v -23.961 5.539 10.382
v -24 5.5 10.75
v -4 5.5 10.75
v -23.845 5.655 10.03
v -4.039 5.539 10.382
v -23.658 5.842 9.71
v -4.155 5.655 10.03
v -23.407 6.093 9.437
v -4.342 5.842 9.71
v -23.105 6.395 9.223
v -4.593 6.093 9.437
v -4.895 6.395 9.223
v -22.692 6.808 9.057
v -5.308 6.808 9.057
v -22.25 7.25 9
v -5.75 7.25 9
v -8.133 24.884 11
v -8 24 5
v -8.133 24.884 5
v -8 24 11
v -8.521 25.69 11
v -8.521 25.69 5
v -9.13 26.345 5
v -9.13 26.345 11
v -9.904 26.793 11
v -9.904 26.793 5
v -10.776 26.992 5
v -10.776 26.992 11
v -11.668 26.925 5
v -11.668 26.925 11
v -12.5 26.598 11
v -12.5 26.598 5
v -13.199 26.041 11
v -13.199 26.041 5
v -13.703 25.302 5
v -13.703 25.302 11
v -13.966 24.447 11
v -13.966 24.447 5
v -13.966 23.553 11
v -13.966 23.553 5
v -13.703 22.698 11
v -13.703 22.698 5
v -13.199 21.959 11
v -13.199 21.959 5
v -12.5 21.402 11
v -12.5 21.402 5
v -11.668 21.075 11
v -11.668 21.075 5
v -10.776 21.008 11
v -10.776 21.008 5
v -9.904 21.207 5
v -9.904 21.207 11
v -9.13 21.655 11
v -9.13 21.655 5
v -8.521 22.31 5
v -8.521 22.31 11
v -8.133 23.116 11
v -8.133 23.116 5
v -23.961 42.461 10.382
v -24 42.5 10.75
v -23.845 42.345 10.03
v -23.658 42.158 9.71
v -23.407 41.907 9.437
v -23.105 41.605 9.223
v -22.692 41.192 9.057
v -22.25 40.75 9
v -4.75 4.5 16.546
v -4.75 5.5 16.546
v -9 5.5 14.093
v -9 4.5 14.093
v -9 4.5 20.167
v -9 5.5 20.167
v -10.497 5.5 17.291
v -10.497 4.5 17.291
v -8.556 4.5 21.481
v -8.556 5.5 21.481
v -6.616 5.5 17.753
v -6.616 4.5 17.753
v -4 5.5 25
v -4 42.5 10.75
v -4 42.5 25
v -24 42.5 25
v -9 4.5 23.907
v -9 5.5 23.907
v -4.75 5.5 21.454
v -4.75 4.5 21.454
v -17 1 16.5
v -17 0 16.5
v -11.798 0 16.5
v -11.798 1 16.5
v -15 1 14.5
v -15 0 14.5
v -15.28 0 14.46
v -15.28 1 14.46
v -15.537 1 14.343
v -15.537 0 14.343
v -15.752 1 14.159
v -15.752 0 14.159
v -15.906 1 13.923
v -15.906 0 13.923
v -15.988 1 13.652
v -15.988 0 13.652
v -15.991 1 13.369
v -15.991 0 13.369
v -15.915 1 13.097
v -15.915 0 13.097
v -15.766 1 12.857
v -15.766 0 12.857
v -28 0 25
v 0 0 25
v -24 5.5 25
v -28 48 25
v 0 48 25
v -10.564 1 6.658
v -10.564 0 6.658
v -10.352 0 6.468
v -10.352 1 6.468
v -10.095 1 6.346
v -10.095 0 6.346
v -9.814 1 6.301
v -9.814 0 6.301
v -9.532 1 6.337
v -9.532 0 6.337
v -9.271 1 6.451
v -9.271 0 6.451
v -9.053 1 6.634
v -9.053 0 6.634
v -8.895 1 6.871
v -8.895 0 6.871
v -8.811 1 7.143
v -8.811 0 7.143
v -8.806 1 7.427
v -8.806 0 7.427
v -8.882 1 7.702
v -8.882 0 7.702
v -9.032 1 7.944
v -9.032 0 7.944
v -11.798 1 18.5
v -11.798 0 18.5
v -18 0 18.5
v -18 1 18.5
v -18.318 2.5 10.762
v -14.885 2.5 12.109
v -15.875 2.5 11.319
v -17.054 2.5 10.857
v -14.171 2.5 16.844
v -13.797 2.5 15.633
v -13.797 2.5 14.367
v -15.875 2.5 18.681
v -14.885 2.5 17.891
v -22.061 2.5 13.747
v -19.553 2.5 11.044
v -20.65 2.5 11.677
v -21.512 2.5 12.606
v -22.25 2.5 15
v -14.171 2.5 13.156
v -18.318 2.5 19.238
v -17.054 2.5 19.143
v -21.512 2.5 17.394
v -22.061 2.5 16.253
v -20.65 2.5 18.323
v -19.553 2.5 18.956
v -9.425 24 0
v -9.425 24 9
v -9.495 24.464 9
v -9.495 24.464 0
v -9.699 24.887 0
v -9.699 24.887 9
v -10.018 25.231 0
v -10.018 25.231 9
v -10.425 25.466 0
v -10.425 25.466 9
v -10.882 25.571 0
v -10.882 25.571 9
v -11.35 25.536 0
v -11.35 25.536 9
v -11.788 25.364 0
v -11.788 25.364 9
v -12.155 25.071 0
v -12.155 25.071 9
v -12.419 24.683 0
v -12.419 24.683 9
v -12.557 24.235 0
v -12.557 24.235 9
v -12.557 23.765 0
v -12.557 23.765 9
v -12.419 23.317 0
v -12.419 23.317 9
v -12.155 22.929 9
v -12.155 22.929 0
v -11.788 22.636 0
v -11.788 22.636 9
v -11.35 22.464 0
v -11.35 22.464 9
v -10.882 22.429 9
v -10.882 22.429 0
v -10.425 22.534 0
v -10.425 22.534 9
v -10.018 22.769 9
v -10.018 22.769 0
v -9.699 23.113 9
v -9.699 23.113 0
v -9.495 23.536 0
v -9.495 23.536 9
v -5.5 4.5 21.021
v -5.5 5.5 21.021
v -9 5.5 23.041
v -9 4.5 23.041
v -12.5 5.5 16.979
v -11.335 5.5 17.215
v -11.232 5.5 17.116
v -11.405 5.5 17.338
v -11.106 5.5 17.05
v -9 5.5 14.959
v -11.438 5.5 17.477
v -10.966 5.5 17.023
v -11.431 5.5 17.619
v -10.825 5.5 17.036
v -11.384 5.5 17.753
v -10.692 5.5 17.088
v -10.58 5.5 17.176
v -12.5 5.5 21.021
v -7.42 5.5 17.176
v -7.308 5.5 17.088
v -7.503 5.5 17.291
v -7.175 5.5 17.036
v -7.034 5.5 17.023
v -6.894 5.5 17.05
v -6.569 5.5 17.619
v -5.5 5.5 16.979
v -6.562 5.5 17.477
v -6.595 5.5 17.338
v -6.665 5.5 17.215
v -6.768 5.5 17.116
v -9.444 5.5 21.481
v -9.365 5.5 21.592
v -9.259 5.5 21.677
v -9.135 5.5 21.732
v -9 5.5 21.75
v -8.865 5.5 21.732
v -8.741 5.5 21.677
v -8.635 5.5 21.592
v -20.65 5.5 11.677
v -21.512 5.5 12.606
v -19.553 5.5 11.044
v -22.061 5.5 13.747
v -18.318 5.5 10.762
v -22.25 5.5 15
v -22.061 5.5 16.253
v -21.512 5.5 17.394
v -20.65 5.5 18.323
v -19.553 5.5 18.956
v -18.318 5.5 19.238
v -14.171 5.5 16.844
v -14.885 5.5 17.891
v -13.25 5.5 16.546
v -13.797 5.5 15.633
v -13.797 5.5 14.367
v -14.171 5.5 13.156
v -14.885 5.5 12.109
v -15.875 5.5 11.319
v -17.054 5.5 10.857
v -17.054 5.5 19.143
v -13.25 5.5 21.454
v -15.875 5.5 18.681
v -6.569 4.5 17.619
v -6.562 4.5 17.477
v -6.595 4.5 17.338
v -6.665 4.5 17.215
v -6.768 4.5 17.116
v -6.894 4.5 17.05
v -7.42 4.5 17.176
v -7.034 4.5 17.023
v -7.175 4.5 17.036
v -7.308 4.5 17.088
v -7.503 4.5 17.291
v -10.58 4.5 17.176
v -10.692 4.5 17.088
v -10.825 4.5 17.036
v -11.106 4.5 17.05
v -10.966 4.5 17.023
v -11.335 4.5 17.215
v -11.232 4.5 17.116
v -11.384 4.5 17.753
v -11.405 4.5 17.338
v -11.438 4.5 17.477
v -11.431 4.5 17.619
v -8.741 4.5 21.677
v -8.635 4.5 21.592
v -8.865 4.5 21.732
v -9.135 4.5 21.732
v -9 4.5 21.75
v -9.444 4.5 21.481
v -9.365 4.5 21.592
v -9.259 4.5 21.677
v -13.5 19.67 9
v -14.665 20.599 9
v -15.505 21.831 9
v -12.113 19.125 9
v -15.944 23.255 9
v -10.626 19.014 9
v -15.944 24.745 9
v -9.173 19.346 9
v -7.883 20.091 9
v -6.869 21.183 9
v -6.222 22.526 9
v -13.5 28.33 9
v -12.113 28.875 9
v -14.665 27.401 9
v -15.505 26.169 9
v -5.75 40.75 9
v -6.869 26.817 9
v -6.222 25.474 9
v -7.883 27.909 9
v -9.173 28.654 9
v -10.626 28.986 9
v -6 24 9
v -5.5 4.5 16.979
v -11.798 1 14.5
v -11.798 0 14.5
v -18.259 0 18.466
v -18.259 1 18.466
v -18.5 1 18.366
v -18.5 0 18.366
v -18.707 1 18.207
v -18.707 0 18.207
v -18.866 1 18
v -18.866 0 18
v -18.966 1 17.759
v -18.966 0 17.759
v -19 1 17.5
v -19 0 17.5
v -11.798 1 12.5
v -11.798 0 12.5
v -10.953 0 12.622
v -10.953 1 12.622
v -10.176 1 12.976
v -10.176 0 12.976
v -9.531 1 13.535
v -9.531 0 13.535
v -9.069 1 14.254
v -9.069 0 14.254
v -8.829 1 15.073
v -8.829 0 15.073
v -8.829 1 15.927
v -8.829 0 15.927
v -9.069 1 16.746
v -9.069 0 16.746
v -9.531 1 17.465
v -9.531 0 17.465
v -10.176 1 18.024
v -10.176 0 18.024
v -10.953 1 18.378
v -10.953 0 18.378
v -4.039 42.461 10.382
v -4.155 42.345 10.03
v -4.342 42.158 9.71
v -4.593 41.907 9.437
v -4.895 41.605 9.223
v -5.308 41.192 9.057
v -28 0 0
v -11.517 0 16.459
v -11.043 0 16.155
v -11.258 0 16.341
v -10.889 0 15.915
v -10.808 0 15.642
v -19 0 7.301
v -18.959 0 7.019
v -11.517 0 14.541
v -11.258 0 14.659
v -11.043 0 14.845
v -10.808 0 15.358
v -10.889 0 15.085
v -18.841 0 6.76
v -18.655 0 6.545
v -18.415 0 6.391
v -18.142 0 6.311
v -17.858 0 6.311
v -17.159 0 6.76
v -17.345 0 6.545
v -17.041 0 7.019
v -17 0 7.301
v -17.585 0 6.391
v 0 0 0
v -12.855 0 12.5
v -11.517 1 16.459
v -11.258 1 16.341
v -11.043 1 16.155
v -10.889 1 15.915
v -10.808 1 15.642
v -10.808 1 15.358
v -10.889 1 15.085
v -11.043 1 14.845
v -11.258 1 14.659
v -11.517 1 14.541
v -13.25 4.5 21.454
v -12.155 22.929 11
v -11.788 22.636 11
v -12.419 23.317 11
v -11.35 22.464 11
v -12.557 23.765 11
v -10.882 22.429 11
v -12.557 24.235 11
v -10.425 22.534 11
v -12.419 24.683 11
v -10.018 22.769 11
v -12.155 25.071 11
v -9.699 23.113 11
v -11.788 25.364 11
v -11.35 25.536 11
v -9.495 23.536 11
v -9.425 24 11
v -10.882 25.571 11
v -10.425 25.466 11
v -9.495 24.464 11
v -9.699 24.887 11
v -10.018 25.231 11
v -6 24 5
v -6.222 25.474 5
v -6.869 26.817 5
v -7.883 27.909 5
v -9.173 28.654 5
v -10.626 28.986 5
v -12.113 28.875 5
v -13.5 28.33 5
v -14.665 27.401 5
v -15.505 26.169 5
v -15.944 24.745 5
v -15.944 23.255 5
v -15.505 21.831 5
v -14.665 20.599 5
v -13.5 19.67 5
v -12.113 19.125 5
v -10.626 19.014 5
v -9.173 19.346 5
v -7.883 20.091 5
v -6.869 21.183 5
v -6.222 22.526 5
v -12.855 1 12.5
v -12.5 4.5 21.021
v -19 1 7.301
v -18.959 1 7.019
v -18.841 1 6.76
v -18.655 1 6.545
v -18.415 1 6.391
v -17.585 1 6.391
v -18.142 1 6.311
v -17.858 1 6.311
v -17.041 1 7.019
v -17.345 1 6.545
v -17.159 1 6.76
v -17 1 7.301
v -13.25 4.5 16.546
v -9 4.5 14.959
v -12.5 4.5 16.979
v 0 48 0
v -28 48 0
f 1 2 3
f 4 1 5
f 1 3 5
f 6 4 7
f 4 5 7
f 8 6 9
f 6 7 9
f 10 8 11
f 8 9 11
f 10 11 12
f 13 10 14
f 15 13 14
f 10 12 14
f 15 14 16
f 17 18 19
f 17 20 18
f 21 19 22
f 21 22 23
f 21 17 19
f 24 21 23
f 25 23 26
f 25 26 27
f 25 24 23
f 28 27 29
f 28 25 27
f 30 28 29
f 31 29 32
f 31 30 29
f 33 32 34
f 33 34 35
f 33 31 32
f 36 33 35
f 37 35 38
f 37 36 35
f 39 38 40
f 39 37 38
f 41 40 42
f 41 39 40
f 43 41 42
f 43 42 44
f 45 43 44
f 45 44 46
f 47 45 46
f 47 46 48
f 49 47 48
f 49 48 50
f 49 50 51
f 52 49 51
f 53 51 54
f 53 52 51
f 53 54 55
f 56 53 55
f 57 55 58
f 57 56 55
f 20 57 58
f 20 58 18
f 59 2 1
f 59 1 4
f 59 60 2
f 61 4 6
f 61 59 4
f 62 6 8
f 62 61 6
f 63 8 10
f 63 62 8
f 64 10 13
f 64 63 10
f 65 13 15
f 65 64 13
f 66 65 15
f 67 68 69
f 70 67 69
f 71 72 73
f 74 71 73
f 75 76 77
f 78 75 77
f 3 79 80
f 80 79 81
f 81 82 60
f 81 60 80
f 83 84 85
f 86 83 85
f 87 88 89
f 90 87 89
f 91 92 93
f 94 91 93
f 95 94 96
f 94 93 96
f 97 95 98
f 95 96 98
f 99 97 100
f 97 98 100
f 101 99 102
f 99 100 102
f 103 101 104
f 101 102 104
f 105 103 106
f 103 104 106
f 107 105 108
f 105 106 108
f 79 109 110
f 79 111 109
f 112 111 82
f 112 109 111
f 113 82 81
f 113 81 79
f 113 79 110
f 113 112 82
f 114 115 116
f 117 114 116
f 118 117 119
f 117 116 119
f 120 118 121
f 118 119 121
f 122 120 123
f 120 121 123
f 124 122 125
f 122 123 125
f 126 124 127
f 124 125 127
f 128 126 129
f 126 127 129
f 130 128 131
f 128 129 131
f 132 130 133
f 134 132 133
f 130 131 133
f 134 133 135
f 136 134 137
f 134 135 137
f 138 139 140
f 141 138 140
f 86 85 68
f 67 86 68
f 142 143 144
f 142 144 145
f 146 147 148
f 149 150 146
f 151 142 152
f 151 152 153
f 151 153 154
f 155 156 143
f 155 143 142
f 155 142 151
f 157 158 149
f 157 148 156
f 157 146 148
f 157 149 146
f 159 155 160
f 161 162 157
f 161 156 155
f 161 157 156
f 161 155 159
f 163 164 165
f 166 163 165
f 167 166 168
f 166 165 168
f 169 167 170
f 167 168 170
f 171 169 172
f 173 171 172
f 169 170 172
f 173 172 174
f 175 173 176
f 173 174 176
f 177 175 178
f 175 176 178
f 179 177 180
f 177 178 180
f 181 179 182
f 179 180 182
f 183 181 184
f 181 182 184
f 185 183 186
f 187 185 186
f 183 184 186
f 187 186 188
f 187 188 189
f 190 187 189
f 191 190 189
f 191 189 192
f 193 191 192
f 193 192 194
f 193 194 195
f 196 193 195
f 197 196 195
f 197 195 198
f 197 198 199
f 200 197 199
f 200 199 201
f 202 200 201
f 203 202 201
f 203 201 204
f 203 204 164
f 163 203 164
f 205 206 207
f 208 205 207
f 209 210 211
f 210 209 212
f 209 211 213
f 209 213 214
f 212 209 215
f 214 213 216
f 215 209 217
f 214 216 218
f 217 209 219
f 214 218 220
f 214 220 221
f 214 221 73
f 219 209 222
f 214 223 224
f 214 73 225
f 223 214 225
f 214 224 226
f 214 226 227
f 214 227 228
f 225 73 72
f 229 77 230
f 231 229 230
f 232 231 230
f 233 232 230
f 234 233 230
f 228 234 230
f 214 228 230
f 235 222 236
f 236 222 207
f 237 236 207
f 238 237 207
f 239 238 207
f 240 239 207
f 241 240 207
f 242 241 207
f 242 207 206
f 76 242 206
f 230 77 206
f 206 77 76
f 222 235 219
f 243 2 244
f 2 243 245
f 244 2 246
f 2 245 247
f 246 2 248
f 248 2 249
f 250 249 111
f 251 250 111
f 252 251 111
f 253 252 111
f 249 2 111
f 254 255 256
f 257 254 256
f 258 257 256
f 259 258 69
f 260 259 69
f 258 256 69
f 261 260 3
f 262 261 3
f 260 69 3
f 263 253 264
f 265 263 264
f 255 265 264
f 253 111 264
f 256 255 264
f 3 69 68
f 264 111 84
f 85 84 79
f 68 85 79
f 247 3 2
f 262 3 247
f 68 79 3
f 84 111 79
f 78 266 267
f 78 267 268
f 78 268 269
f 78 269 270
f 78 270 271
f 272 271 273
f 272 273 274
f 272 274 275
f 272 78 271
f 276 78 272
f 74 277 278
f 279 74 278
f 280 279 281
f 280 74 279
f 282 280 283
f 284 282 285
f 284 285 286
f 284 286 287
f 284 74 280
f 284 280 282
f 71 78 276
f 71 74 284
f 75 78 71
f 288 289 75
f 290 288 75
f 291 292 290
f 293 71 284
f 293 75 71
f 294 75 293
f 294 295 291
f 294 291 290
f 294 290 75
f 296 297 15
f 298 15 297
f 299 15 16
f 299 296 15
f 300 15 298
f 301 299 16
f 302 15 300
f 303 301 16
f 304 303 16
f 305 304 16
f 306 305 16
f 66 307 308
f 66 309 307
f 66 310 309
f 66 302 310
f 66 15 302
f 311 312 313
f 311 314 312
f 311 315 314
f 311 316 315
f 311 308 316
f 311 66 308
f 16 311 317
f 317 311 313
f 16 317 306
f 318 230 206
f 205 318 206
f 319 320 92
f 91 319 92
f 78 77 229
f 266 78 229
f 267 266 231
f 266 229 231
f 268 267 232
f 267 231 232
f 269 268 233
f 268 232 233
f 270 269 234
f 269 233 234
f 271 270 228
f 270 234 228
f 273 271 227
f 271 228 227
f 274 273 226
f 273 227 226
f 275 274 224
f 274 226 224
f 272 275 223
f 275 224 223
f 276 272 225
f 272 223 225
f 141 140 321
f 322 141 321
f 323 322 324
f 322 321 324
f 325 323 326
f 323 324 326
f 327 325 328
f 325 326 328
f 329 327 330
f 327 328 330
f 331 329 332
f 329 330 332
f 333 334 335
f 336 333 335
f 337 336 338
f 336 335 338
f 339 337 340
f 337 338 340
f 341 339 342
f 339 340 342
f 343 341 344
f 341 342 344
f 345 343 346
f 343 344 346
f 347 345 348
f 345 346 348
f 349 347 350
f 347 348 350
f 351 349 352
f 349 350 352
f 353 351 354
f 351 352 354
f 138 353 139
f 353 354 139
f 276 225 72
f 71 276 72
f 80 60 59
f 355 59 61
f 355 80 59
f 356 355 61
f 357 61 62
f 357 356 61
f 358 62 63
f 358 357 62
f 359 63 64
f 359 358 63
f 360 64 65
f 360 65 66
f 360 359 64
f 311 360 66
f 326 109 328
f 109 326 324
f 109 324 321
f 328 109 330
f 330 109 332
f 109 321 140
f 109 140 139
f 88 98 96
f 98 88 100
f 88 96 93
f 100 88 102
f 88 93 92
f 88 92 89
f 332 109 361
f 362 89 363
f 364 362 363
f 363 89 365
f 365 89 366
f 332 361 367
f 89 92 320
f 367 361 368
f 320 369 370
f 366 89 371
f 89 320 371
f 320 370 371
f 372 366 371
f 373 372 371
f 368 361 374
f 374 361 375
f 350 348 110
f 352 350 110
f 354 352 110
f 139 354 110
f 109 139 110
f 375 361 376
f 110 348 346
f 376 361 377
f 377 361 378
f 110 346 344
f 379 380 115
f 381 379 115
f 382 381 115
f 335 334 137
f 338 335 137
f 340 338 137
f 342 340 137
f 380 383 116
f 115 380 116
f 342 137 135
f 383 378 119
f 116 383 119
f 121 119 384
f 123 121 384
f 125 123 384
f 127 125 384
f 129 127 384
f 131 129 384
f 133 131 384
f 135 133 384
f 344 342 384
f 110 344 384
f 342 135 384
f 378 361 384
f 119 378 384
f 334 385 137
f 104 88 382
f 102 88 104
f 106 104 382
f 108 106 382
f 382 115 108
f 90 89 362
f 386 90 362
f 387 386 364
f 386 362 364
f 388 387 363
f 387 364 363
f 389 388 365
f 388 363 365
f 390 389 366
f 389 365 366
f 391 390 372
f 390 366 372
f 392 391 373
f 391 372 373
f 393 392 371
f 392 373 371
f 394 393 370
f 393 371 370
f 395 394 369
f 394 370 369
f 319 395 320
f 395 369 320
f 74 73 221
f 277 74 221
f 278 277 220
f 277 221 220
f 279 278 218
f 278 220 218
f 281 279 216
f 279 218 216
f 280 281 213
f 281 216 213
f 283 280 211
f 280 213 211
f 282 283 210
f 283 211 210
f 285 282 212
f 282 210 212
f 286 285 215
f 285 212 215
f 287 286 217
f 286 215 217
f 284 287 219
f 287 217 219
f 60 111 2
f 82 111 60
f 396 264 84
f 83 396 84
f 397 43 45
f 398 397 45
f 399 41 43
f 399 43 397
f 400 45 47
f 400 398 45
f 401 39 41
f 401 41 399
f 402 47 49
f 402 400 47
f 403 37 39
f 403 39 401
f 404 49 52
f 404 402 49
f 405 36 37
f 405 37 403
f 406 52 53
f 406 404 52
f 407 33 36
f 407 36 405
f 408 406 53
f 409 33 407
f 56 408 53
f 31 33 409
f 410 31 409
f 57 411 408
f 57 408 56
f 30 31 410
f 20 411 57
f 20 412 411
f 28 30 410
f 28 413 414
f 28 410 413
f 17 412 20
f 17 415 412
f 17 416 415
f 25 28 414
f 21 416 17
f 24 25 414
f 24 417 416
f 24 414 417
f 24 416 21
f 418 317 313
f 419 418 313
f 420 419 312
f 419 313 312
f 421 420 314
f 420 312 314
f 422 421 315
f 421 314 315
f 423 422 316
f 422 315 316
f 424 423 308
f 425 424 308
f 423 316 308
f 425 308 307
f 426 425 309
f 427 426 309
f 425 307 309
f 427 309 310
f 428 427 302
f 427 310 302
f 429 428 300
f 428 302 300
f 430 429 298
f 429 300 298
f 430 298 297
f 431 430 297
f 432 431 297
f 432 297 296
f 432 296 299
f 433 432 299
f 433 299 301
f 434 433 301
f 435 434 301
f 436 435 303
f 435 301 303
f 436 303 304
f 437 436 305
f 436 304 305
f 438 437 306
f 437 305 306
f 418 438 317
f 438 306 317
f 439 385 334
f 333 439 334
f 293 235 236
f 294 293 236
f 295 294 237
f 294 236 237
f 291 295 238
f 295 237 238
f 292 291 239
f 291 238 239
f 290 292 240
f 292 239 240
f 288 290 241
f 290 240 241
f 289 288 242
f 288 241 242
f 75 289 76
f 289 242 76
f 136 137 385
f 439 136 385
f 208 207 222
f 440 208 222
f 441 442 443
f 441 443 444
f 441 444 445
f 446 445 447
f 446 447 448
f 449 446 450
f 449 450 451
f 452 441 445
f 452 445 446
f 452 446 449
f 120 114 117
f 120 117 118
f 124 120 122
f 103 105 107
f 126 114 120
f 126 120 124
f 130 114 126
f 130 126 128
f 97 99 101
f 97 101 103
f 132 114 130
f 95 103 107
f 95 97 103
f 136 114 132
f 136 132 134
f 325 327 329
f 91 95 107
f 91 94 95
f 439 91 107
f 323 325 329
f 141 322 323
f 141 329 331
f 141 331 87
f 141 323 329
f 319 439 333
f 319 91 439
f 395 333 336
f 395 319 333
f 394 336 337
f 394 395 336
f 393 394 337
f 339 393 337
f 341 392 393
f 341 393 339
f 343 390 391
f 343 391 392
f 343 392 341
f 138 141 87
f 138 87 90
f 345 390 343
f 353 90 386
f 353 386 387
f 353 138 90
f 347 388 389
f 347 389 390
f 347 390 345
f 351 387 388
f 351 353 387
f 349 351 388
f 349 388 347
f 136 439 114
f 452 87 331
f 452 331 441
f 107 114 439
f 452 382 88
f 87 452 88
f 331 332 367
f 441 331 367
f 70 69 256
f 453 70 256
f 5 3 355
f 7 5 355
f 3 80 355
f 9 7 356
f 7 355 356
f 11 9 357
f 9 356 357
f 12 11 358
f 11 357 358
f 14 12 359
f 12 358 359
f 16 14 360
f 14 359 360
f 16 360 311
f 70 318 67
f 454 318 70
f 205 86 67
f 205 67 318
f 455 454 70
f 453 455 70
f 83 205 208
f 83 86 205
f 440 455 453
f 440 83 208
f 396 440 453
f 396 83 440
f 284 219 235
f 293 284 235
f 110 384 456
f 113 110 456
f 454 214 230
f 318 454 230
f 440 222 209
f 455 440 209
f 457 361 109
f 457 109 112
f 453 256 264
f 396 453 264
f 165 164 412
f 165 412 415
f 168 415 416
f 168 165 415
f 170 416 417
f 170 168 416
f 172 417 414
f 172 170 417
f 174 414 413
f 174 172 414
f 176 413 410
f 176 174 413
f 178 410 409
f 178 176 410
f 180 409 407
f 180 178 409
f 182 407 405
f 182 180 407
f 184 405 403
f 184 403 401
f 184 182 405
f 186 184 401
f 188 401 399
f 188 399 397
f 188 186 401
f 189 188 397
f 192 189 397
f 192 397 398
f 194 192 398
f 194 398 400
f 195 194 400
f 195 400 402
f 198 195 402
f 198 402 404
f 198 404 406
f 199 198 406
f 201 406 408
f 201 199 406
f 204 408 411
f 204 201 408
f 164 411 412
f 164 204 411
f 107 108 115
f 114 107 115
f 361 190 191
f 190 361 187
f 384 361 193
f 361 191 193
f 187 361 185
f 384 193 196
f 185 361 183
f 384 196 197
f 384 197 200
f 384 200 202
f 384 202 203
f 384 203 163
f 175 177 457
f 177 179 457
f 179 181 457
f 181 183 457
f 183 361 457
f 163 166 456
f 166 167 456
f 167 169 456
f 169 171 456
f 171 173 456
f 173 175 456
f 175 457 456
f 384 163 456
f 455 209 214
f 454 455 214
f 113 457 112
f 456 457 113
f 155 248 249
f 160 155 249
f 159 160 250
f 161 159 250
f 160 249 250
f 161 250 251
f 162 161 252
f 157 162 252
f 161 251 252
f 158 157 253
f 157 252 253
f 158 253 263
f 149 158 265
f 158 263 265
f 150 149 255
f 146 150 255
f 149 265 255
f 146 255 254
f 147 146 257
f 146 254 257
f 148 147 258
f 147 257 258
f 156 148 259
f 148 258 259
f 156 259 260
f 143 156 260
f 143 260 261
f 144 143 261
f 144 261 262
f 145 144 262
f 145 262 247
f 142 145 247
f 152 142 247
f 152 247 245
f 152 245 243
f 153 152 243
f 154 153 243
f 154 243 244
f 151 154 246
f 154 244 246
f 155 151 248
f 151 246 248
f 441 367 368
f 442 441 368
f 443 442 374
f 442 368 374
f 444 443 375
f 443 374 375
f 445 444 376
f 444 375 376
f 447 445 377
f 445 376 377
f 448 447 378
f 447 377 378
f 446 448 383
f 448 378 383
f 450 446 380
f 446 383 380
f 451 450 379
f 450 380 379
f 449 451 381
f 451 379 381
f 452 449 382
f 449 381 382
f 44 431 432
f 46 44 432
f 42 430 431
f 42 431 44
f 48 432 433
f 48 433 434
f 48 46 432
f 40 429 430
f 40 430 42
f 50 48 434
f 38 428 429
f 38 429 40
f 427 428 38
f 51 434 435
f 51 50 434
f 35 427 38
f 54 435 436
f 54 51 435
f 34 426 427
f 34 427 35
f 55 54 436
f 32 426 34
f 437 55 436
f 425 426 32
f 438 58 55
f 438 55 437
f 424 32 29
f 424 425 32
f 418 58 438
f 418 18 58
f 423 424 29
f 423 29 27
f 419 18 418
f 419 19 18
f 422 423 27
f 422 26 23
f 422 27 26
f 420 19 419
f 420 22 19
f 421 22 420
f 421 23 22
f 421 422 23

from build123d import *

# Parameters (mm, degrees)
F0_W      = 28
F0_H      = 48
F1_DEPTH  = 25
F2_W      = 20
F2_H      = 37
F3_DEPTH  = 16
F4_R      = 3
F4_R_2    = 1.575
F5_DEPTH  = 2
F6_R      = 5
F6_R_2    = 3
F7_DEPTH  = 4
F8_R      = 4.25
F9_DEPTH  = 3
F10_DEPTH = 9.001
F14_DEPTH = 1
F17_DEPTH = 1
F18_R     = 1.74999


# Not quite as in the source:
# - a fillet or chamfer is up to 0.001 mm smaller than in the source, because OpenCascade refuses the exact size


with BuildPart() as f1:
    # F0 (on Top) → F1 (new body)
    with BuildSketch(Plane.XY):
        with Locations((-14, 24)):
            Rectangle(F0_W, F0_H)
    extrude(amount=F1_DEPTH)

    # F2 (on face) → F3 (cut)
    with BuildSketch(Plane.XY.offset(25)):
        with Locations((-14, 24)):
            Rectangle(F2_W, F2_H)
    extrude(amount=-F3_DEPTH, mode=Mode.SUBTRACT)

    # F4 (on face) → F5 (join)
    with BuildSketch(Plane.XY.offset(9)):
        with Locations((-11, 24)):
            Circle(F4_R)
        with Locations((-11, 24)):
            Circle(F4_R_2, mode=Mode.SUBTRACT)
    extrude(amount=F5_DEPTH)

    # F6 (on face) → F7 (cut)
    with BuildSketch(Plane.XY.offset(9)):
        with Locations((-11, 24)):
            Circle(F6_R)
        with Locations((-11, 24)):
            Circle(F6_R_2, mode=Mode.SUBTRACT)
    extrude(amount=-F7_DEPTH, mode=Mode.SUBTRACT)

    # F8 (on face) → F9 (cut)
    with BuildSketch(Plane(origin=(0, 5.5, 0), x_dir=(-1, 0, 0), z_dir=(0, 1, 0))):
        with Locations((18, 15)):
            Circle(F8_R)
    extrude(amount=-F9_DEPTH, mode=Mode.SUBTRACT)

    # F10 (cut, through all): a face of the model
    f10_faces = [f1.faces().sort_by_distance(p)[0] for p in [
        (-11, 24, 9),
    ]]
    extrude(f10_faces, amount=-F10_DEPTH, mode=Mode.SUBTRACT)

    # F13 (on face) → F14 (cut)
    with BuildSketch(Plane.XZ):
        with BuildLine():
            ThreePointArc((-19, 7.3008629454), (-18, 6.3008629454), (-17, 7.3008629454))
            Line((-17, 7.3008629454), (-17, 16.5))
            Line((-17, 16.5), (-17, 18.5))
            Line((-17, 18.5), (-18, 18.5))
            ThreePointArc((-18, 18.5), (-18.7071067812, 18.2071067812), (-19, 17.5))
            Line((-19, 17.5), (-19, 7.3008629454))
        make_face()
        with BuildLine():
            Line((-17, 18.5), (-17, 16.5))
            Line((-17, 16.5), (-11.7983063839, 16.5))
            ThreePointArc((-11.7983063839, 16.5), (-10.7983063839, 15.5), (-11.7983063839, 14.5))
            Line((-11.7983063839, 14.5), (-15, 14.5))
            ThreePointArc((-15, 14.5), (-14.5773817383, 14.406307787), (-14.2339555569, 14.1427876097))
            Line((-14.2339555569, 14.1427876097), (-12.8554930795, 12.5))
            Line((-12.8554930795, 12.5), (-11.7983063839, 12.5))
            ThreePointArc((-11.7983063839, 12.5), (-8.7983063839, 15.5), (-11.7983063839, 18.5))
            Line((-11.7983063839, 18.5), (-17, 18.5))
        make_face()
        with BuildLine():
            ThreePointArc((-14.2339555569, 14.1427876097), (-14.5773817383, 14.406307787), (-15, 14.5))
            ThreePointArc((-15, 14.5), (-15.906307787, 13.9226182617), (-15.7660444431, 12.8572123903))
            ThreePointArc((-15.7660444431, 12.8572123903), (-15.4226182617, 12.593692213), (-15, 12.5))
            ThreePointArc((-15, 12.5), (-14.2928932188, 12.7928932188), (-14, 13.5))
            ThreePointArc((-14, 13.5), (-14.0603073792, 13.8420201433), (-14.2339555569, 14.1427876097))
        make_face()
        with BuildLine():
            Line((-9.0322619408, 7.9436505551), (-12.8554930795, 12.5))
            Line((-12.8554930795, 12.5), (-15, 12.5))
            ThreePointArc((-15, 12.5), (-15.4226182617, 12.593692213), (-15.7660444431, 12.8572123903))
            Line((-15.7660444431, 12.8572123903), (-10.564350827, 6.6580753357))
            ThreePointArc((-10.564350827, 6.6580753357), (-9.1555187742, 6.5348185023), (-9.0322619408, 7.9436505551))
        make_face()
        with BuildLine():
            Line((-15, 12.5), (-12.8554930795, 12.5))
            Line((-12.8554930795, 12.5), (-14.2339555569, 14.1427876097))
            ThreePointArc((-14.2339555569, 14.1427876097), (-14.0603073792, 13.8420201433), (-14, 13.5))
            ThreePointArc((-14, 13.5), (-14.2928932188, 12.7928932188), (-15, 12.5))
        make_face()
    extrude(amount=-F14_DEPTH, mode=Mode.SUBTRACT)

    # F16 (on face) → F17 (cut)
    with BuildSketch(Plane(origin=(0, 5.5, 0), x_dir=(-1, 0, 0), z_dir=(0, 1, 0))):
        Polygon((9, 14.0925227119), (13.25, 16.5462613559), (13.25, 21.4537386441), (9, 23.9074772881), (4.75, 21.4537386441), (4.75, 16.5462613559), align=None)
        Polygon((9, 14.9585481157), (5.5, 16.9792740578), (5.5, 21.0207259422), (9, 23.0414518843), (12.5, 21.0207259422), (12.5, 16.9792740578), align=None, mode=Mode.SUBTRACT)
        with BuildLine():
            Line((7.5029805213, 17.2914120527), (6.6159696882, 17.7531606659))
            ThreePointArc((6.6159696882, 17.7531606659), (6.8286007981, 17.0787809427), (7.5029805213, 17.2914120527))
        make_face()
        with BuildLine():
            ThreePointArc((8.5564945834, 21.0191256934), (8.5, 21.25), (8.5564945834, 21.4808743066))
            Line((8.5564945834, 21.4808743066), (6.6159696882, 17.7531606659))
            Line((6.6159696882, 17.7531606659), (7.5029805213, 17.2914120527))
            Line((7.5029805213, 17.2914120527), (9, 20.1671597149))
            Line((9, 20.1671597149), (8.5564945834, 21.0191256934))
        make_face()
        with BuildLine():
            Line((9, 20.1671597149), (9.4435054166, 21.0191256934))
            ThreePointArc((9.4435054166, 21.0191256934), (9, 20.75), (8.5564945834, 21.0191256934))
            Line((8.5564945834, 21.0191256934), (9, 20.1671597149))
        make_face()
        with BuildLine():
            ThreePointArc((9.4435054166, 21.0191256934), (9.4856710349, 21.1311570538), (9.5, 21.25))
            ThreePointArc((9.5, 21.25), (9.4856710349, 21.3688429462), (9.4435054166, 21.4808743066))
            ThreePointArc((9.4435054166, 21.4808743066), (9, 21.75), (8.5564945834, 21.4808743066))
            ThreePointArc((8.5564945834, 21.4808743066), (8.5, 21.25), (8.5564945834, 21.0191256934))
            ThreePointArc((8.5564945834, 21.0191256934), (9, 20.75), (9.4435054166, 21.0191256934))
        make_face()
        with BuildLine():
            ThreePointArc((9.4435054166, 21.4808743066), (9.4856710349, 21.3688429462), (9.5, 21.25))
            ThreePointArc((9.5, 21.25), (9.4856710349, 21.1311570538), (9.4435054166, 21.0191256934))
            Line((9.4435054166, 21.0191256934), (9, 20.1671597149))
            Line((9, 20.1671597149), (10.4970194787, 17.2914120527))
            Line((10.4970194787, 17.2914120527), (11.3840303118, 17.7531606659))
            Line((11.3840303118, 17.7531606659), (9.4435054166, 21.4808743066))
        make_face()
        with BuildLine():
            ThreePointArc((10.4970194787, 17.2914120527), (11.1713992019, 17.0787809427), (11.3840303118, 17.7531606659))
            Line((11.3840303118, 17.7531606659), (10.4970194787, 17.2914120527))
        make_face()
    extrude(amount=-F17_DEPTH, mode=Mode.SUBTRACT)

    # F18 (radius 1.75 in the source; OpenCascade refuses exactly that, so slightly less here)
    f18_edges = [f1.edges().sort_by_distance(p)[0] for p in [
        (-24, 24, 9),
        (-14, 42.5, 9),
        (-4, 24, 9),
        (-14, 5.5, 9),
    ]]
    fillet(f18_edges, radius=F18_R)


solid = f1.part
